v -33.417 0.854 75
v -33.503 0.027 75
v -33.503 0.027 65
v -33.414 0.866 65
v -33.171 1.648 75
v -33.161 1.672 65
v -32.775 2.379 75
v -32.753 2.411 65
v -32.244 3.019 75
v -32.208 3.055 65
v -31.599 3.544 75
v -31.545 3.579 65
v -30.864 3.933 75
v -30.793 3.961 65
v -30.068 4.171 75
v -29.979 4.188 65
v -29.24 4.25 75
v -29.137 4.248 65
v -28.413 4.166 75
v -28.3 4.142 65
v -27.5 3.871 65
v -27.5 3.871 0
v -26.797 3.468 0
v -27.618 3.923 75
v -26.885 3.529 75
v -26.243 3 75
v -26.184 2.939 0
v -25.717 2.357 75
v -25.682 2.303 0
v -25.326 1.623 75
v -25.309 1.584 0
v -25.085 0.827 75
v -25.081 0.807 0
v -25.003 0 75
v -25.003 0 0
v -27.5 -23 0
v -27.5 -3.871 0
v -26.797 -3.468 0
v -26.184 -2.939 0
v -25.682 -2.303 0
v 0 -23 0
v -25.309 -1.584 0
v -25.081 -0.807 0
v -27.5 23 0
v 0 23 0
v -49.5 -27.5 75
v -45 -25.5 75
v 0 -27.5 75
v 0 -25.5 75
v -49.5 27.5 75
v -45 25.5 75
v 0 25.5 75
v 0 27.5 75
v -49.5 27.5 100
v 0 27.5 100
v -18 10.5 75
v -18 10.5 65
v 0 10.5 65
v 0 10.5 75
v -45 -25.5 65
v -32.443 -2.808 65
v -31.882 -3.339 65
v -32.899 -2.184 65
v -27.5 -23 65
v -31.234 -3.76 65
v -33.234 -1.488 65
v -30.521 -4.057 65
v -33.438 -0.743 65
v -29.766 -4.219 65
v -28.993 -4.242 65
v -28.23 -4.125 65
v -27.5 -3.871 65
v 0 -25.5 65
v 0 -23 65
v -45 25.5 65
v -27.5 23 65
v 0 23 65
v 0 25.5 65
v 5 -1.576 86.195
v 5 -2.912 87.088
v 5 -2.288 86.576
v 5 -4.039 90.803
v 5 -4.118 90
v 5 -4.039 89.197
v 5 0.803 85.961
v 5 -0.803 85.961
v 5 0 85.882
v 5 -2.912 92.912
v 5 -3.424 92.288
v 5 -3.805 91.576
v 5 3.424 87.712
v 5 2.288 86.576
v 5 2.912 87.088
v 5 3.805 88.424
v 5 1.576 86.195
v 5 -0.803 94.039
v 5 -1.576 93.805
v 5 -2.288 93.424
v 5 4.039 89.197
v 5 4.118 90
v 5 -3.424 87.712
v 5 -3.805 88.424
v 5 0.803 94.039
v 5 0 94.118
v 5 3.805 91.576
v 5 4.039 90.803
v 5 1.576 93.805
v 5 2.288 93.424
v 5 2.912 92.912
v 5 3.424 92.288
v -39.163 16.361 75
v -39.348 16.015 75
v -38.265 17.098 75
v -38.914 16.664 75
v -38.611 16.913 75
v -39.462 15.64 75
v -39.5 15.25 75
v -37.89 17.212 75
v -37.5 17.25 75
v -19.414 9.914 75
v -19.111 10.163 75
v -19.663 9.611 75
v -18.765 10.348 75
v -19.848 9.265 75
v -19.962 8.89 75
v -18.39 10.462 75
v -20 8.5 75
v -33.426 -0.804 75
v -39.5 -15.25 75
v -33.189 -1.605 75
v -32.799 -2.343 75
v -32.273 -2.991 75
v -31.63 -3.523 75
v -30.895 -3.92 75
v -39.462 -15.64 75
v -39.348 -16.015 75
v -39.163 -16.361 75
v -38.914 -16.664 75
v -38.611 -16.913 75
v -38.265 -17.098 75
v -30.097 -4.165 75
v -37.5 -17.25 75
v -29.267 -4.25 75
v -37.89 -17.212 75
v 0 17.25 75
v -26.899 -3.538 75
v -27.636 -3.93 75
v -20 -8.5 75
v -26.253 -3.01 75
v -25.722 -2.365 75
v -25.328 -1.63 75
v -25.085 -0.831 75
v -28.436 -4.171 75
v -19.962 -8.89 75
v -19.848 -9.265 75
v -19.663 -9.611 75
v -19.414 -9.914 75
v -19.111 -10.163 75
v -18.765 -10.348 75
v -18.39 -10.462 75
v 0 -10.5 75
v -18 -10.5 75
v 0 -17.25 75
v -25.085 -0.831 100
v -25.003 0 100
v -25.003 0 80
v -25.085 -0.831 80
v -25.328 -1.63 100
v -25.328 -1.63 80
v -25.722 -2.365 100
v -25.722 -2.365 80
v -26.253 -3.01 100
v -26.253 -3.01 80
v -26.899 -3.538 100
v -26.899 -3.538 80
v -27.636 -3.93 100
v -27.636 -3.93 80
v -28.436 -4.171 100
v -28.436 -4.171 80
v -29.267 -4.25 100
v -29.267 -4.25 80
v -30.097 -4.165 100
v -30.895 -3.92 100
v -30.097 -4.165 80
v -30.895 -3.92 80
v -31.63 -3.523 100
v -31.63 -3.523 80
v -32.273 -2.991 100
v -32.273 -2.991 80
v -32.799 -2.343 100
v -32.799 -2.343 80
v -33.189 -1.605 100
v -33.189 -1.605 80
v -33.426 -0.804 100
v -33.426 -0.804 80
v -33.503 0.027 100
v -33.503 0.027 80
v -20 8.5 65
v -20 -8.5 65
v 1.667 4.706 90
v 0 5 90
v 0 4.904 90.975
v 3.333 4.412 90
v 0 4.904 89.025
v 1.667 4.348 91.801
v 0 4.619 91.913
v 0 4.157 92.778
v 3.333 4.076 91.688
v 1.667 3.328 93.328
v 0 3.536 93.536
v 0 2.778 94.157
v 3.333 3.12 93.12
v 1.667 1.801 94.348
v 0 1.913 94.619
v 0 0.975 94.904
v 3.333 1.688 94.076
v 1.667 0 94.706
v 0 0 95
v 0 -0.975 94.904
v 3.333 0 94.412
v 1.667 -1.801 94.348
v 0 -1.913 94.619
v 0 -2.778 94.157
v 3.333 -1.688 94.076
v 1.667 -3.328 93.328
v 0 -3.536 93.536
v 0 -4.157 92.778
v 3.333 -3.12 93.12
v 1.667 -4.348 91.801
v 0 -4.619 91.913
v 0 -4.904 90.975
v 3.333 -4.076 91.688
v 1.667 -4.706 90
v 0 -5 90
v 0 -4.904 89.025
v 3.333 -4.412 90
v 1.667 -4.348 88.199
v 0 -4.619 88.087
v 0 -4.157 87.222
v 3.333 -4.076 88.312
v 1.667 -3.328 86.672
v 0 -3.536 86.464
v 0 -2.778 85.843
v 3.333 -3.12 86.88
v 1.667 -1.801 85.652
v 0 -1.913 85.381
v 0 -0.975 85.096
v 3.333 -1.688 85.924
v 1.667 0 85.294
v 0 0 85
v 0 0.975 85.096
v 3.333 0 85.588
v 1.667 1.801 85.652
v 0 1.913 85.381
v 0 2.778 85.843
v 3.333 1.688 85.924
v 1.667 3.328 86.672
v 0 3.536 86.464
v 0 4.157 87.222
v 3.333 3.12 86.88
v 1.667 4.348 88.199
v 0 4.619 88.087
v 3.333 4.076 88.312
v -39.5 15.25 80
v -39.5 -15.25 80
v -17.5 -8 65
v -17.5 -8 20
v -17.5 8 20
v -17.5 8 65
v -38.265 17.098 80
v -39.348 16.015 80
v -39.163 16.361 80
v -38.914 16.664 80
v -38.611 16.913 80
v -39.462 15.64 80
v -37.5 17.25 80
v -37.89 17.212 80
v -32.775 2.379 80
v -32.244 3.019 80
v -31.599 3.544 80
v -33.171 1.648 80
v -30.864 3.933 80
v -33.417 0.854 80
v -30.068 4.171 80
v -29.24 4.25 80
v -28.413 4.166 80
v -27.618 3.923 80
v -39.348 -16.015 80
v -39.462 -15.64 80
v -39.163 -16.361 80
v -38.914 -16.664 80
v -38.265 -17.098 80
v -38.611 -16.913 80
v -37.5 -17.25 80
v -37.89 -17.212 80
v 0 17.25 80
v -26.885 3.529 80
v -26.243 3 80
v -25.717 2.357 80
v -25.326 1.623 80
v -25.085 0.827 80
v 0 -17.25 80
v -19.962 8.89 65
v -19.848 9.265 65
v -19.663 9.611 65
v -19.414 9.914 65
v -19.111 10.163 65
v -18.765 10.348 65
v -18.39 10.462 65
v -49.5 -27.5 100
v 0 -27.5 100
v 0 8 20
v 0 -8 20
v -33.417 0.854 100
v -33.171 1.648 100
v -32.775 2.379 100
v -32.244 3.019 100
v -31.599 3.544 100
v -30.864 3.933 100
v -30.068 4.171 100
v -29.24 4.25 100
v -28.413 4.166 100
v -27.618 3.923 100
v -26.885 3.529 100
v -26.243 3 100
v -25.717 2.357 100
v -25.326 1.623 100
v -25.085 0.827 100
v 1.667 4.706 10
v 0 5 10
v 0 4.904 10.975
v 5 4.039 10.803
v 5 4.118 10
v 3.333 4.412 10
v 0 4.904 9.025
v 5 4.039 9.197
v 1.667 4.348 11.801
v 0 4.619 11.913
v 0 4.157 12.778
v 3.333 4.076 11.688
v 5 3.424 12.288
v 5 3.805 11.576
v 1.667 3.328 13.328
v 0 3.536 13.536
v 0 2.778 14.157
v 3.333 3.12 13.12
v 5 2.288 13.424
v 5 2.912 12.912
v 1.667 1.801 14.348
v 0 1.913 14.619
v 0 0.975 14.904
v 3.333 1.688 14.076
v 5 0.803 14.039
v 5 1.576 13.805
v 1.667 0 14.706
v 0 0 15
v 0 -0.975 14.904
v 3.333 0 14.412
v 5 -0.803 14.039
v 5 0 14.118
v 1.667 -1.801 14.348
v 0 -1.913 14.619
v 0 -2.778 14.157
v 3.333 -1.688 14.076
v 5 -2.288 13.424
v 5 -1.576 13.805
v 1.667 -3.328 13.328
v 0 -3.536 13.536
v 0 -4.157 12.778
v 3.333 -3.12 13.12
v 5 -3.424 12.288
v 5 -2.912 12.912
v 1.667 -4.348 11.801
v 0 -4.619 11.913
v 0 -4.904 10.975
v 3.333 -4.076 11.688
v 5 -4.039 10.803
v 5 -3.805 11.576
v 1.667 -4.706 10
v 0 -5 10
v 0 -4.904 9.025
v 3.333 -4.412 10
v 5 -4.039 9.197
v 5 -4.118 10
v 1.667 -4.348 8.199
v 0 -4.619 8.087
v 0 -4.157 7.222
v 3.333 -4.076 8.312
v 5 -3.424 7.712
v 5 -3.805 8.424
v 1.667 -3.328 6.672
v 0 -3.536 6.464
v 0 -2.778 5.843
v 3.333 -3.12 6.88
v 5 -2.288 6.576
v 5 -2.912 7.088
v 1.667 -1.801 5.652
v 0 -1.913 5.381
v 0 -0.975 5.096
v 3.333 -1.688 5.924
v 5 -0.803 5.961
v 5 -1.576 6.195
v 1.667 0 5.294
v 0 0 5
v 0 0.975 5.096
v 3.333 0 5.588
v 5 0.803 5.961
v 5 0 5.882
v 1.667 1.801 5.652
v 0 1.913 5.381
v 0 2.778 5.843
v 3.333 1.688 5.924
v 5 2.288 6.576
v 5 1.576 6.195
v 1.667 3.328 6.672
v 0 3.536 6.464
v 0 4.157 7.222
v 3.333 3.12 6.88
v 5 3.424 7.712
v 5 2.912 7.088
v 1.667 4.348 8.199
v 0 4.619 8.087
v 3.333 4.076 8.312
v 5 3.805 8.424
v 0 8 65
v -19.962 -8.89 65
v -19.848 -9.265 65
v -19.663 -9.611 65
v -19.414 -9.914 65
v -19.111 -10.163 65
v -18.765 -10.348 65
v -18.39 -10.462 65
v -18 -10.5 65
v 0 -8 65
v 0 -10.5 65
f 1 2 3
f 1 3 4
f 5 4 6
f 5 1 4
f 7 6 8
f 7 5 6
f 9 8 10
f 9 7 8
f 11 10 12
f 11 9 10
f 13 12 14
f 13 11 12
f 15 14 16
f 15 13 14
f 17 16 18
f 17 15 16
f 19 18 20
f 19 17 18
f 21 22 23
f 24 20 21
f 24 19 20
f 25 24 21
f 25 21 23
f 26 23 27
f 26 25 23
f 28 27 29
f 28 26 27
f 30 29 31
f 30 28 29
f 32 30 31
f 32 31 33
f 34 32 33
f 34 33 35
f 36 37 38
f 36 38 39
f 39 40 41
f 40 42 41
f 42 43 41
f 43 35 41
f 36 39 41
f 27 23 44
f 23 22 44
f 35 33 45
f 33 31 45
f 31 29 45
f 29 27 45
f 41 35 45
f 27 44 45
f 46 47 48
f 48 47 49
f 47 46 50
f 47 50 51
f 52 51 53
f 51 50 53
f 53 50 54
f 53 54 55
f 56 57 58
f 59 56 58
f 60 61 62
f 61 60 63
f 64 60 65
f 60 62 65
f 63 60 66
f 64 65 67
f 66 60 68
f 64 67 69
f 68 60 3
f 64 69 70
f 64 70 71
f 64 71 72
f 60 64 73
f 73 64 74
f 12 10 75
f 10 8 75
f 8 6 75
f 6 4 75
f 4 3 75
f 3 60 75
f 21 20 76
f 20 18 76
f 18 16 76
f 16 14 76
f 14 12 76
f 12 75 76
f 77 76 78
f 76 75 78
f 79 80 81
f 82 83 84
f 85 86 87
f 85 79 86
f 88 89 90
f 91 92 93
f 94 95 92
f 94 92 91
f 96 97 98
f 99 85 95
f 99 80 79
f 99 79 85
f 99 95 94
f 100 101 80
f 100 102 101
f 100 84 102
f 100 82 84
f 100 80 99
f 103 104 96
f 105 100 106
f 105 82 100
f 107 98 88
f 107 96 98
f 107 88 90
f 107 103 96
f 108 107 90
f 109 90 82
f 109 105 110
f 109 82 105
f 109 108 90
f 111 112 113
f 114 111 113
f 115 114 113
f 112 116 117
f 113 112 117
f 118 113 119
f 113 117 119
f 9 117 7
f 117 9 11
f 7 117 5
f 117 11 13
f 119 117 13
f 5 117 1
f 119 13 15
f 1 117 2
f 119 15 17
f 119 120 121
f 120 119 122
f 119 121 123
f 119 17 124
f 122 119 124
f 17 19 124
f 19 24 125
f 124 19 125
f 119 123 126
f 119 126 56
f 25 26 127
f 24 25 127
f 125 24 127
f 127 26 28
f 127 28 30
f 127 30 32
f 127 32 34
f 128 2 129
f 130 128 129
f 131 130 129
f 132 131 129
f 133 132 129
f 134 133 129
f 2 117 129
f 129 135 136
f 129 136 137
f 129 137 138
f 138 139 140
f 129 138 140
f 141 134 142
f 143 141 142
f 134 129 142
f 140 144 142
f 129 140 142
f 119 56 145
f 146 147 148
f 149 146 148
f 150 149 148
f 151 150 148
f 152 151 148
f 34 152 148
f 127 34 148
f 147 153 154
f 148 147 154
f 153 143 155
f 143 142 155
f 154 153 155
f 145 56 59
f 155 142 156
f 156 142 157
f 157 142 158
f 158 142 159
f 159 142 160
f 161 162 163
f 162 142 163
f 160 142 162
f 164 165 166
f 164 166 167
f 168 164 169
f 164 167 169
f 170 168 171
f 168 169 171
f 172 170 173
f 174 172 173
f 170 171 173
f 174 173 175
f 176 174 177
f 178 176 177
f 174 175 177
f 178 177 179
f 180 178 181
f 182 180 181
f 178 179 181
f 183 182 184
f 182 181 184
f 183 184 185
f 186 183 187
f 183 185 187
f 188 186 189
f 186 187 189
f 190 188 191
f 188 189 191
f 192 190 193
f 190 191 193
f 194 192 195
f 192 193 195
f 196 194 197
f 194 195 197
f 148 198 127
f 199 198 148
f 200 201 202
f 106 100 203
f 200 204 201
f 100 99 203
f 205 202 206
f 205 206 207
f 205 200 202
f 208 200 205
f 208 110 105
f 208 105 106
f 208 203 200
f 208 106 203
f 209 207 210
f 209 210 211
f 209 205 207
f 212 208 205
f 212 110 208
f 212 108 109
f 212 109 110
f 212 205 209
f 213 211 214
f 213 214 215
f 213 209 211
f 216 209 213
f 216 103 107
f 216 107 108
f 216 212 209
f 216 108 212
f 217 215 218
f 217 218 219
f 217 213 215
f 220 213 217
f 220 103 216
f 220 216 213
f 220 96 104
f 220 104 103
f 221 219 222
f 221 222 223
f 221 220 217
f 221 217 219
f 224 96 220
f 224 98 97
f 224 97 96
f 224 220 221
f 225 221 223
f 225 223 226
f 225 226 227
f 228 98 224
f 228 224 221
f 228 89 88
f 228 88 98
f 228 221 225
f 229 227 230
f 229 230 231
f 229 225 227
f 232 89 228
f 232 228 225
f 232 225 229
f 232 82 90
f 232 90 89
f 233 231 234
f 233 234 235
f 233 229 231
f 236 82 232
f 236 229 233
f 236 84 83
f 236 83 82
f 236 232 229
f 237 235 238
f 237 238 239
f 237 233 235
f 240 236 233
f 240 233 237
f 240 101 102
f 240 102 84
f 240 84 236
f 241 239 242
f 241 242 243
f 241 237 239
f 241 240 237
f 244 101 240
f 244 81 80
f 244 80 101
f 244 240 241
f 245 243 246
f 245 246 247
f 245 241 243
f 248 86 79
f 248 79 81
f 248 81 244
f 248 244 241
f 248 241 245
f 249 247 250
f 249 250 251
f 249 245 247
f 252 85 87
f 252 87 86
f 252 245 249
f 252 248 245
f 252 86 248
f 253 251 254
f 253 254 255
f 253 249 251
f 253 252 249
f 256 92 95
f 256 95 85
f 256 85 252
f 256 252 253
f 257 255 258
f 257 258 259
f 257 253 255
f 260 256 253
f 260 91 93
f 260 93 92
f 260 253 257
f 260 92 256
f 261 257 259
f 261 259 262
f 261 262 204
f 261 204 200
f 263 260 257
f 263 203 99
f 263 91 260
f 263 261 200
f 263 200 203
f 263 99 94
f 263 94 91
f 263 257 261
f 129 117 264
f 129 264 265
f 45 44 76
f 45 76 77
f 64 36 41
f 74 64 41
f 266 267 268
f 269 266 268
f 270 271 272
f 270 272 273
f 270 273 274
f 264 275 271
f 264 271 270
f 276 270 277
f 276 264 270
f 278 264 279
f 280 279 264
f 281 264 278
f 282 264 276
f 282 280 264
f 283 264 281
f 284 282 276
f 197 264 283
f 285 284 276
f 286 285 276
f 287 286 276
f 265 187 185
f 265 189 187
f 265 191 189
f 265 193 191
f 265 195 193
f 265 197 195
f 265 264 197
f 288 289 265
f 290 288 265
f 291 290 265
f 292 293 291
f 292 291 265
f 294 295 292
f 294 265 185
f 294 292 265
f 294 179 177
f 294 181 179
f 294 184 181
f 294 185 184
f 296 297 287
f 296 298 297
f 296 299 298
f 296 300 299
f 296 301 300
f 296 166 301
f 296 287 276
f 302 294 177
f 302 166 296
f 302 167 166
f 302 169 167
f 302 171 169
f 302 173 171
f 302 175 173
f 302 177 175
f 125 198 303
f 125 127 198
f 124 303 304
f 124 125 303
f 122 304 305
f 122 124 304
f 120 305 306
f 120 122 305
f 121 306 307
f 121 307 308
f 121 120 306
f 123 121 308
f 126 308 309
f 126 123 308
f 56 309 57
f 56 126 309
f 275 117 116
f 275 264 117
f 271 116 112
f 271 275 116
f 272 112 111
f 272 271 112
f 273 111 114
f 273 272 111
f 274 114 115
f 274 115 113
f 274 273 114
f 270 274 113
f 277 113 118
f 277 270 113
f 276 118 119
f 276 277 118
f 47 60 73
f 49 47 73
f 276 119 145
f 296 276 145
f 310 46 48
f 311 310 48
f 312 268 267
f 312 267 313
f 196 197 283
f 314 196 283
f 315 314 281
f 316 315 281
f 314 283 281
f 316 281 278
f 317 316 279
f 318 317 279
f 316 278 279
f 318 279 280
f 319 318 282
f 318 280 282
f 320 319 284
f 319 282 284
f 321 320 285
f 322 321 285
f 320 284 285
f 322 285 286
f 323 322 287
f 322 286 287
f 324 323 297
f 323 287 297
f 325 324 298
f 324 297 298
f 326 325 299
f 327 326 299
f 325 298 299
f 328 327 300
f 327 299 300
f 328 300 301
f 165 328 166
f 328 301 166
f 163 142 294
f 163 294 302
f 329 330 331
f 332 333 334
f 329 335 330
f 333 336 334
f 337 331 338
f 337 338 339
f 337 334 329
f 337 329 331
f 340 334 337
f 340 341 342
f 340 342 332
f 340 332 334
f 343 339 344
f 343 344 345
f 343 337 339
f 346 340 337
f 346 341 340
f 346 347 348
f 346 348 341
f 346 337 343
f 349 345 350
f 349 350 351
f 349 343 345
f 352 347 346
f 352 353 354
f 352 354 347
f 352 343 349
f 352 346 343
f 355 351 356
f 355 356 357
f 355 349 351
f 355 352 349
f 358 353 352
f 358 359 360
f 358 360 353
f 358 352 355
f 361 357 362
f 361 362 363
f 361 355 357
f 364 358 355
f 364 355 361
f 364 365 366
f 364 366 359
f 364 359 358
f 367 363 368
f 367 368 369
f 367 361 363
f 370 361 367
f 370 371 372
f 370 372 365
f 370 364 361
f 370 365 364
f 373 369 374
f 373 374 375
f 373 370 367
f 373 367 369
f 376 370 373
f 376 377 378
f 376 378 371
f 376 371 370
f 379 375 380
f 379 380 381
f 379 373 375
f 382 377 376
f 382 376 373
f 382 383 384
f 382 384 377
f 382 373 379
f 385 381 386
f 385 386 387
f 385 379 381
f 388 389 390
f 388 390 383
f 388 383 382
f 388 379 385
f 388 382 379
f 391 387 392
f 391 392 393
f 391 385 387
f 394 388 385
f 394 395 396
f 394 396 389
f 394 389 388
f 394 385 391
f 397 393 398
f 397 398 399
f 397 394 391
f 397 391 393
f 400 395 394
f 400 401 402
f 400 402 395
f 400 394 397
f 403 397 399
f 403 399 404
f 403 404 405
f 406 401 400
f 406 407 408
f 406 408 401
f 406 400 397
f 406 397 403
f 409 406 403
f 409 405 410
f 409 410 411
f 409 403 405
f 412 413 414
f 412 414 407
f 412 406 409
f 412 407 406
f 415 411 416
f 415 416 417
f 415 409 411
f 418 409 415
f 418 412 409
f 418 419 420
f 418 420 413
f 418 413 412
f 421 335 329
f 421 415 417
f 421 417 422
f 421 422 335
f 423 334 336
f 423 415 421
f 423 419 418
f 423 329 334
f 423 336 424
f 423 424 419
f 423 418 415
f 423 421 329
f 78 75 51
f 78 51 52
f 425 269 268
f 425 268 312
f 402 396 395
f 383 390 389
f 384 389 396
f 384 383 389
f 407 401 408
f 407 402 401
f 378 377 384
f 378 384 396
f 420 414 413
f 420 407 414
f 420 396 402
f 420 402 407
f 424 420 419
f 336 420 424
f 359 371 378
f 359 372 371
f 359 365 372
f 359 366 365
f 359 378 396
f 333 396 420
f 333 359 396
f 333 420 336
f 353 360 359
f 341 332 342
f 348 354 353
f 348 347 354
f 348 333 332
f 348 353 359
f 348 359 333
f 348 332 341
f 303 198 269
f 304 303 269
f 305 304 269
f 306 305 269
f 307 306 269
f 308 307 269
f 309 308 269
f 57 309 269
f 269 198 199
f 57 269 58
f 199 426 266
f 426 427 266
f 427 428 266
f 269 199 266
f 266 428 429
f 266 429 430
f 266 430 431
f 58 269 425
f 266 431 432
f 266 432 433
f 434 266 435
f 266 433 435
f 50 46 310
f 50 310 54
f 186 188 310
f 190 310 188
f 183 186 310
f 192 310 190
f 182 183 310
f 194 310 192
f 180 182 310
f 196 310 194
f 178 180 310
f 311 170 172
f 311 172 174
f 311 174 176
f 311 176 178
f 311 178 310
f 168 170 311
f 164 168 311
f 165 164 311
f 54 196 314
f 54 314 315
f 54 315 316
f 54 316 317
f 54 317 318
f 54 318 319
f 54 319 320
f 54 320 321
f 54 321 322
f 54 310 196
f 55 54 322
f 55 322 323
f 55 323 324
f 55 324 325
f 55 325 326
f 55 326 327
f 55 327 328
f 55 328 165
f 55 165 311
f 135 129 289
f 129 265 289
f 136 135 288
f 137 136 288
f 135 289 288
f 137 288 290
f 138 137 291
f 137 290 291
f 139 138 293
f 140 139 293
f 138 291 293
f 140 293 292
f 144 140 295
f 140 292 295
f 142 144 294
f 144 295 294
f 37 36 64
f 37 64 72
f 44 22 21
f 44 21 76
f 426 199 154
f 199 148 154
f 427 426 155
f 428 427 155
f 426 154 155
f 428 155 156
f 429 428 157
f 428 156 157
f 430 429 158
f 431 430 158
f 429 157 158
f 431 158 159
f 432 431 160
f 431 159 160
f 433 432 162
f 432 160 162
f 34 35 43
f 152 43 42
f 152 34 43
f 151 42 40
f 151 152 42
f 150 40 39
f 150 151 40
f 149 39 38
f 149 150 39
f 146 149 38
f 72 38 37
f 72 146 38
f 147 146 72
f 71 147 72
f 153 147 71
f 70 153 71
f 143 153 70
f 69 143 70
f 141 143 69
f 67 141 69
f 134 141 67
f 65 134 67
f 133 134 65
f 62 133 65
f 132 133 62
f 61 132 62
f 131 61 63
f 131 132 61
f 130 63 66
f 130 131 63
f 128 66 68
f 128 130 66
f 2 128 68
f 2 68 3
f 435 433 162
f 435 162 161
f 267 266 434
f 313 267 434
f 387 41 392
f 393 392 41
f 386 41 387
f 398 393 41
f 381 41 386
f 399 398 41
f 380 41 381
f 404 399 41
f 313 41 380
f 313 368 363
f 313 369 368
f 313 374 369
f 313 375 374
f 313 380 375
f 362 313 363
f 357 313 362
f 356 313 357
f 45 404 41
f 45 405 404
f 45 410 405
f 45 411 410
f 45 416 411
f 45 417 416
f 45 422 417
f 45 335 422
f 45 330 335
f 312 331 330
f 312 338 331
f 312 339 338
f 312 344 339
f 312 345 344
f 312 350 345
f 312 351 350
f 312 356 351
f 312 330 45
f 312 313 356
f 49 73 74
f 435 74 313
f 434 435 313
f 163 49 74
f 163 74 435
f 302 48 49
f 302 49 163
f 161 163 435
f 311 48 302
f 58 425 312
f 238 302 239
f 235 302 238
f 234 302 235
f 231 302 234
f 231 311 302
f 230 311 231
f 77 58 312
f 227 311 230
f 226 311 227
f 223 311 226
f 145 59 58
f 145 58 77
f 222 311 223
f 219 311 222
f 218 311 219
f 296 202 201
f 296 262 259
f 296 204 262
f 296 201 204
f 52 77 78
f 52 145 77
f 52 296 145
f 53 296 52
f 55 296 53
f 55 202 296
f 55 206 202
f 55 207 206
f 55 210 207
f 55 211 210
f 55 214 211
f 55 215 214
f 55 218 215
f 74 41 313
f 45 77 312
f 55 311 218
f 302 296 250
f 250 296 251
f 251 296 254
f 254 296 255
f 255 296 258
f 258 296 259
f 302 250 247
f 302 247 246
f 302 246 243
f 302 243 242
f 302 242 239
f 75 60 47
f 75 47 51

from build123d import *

# Parameters (mm, degrees)
F0_W        = 55
F0_H        = 46
F1_DEPTH    = 65
F2_W        = 35
F2_H        = 16
F3_DEPTH    = 45
F4_W        = 90
F4_H        = 51
F5_DEPTH    = 10
F6_W        = 40
F6_H        = 21
F7_DEPTH    = 10
F8_R        = 2
F9_W        = 99
F9_H        = 55
F10_DEPTH   = 25
F11_W       = 79
F11_H       = 34.5
F11_W_2     = 82.297604531
F11_H_2     = 1.4667510986
F12_DEPTH   = 5
F13_R       = 2
F14_R       = 2
F15_R       = 2
F16_R       = 2
F18_DEPTH   = 100
F19_R       = 4.25
F20_DEPTH   = 5
F21_W       = 144.5901691914
F21_H       = 163.5245941579
F10_FACE1_W = 55
F10_FACE1_H = 25
F1_FACE1_W  = 46
F1_FACE1_H  = 65
F22_DEPTH   = 49.501
F23_R       = 5
F24_DEPTH   = 5
F24_TAPER   = 10


with BuildPart() as f1:
    # F0 (on Top) → F1 (new body)
    with BuildSketch(Plane.XY):
        Rectangle(F0_W, F0_H)
    extrude(amount=F1_DEPTH)

    # F2 (on face) → F3 (cut)
    with BuildSketch(Plane.XY.offset(65)):
        Rectangle(F2_W, F2_H)
    extrude(amount=-F3_DEPTH, mode=Mode.SUBTRACT)

    # F4 (on face) → F5 (join)
    with BuildSketch(Plane.XY.offset(65)):
        Rectangle(F4_W, F4_H)
    extrude(amount=F5_DEPTH)

    # F6 (on face) → F7 (cut)
    with BuildSketch(Plane(origin=(0, 0, 65), x_dir=(1, 0, 0), z_dir=(0, 0, -1))):
        Rectangle(F6_W, F6_H)
    extrude(amount=-F7_DEPTH, mode=Mode.SUBTRACT)

    # F8
    f8_edges = [f1.edges().sort_by_distance(p)[0] for p in [
        (-20, -10.5, 70),
        (-20, 10.5, 70),
        (20, 10.5, 70),
        (20, -10.5, 70),
    ]]
    fillet(f8_edges, radius=F8_R)

    # F9 (on face) → F10 (join)
    with BuildSketch(Plane.XY.offset(75)):
        Rectangle(F9_W, F9_H)
    extrude(amount=F10_DEPTH)

    # F11 (on face) → F12 (cut)
    with BuildSketch(Plane(origin=(0, 0, 75), x_dir=(1, 0, 0), z_dir=(0, 0, -1))):
        Rectangle(F11_W, F11_H)
        with Locations((-69.0755546093, -53.2094612718)):
            Rectangle(F11_W_2, F11_H_2)
    extrude(amount=-F12_DEPTH, mode=Mode.SUBTRACT)

    # F13
    f13_edges = [f1.edges().sort_by_distance(p)[0] for p in [
        (-39.5, 17.25, 77.5),
    ]]
    fillet(f13_edges, radius=F13_R)

    # F14
    f14_edges = [f1.edges().sort_by_distance(p)[0] for p in [
        (-39.5, -17.25, 77.5),
    ]]
    fillet(f14_edges, radius=F14_R)

    # F15
    f15_edges = [f1.edges().sort_by_distance(p)[0] for p in [
        (39.5, -17.25, 77.5),
    ]]
    fillet(f15_edges, radius=F15_R)

    # F16
    f16_edges = [f1.edges().sort_by_distance(p)[0] for p in [
        (39.5, 17.25, 77.5),
    ]]
    fillet(f16_edges, radius=F16_R)

    # F17 (on face) → F18 (cut, symmetric)
    with BuildSketch(Plane(origin=(0, 0, 80), x_dir=(1, 0, 0), z_dir=(0, 0, -1))):
        with BuildLine():
            ThreePointArc((-33.5031947748, -0.0268816754), (-29.2398388853, -4.2499787461), (-25.0032797903, 0))
            ThreePointArc((-25.0032797903, 0), (-29.2667206952, 4.2499787461), (-33.5031947748, -0.0268816754))
        make_face()
    extrude(amount=F18_DEPTH, both=True, mode=Mode.SUBTRACT)

    # F19 (on face) → F20 (join)
    with BuildSketch(Plane(origin=(0, 0, 80), x_dir=(1, 0, 0), z_dir=(0, 0, -1))):
        with Locations((29.5, 0)):
            Circle(F19_R)
    extrude(amount=F20_DEPTH)

    # F21 (on Right) + F10_face1 (on face) + F1_face1 (on face) → F22 (cut, through all)
    with BuildSketch(Plane.YZ):
        with Locations((-4.733607173, 21.3217232376)):
            Rectangle(F21_W, F21_H)
    with BuildSketch(Plane(origin=(49.5, 0, 87.5), x_dir=(0, 1, 0), z_dir=(1, 0, 0))):
        Rectangle(F10_FACE1_W, F10_FACE1_H)
    with BuildSketch(Plane(origin=(27.5, 0, 32.5), x_dir=(0, 1, 0), z_dir=(1, 0, 0))):
        Rectangle(F1_FACE1_W, F1_FACE1_H)
    extrude(amount=F22_DEPTH, mode=Mode.SUBTRACT)

    # F23 (on face) → F24 (join)
    with BuildSketch(Plane.YZ):
        with Locations((0, 10)):
            Circle(F23_R)
        with Locations((0, 90)):
            Circle(F23_R)
    extrude(amount=F24_DEPTH, taper=F24_TAPER)


solid = f1.part
